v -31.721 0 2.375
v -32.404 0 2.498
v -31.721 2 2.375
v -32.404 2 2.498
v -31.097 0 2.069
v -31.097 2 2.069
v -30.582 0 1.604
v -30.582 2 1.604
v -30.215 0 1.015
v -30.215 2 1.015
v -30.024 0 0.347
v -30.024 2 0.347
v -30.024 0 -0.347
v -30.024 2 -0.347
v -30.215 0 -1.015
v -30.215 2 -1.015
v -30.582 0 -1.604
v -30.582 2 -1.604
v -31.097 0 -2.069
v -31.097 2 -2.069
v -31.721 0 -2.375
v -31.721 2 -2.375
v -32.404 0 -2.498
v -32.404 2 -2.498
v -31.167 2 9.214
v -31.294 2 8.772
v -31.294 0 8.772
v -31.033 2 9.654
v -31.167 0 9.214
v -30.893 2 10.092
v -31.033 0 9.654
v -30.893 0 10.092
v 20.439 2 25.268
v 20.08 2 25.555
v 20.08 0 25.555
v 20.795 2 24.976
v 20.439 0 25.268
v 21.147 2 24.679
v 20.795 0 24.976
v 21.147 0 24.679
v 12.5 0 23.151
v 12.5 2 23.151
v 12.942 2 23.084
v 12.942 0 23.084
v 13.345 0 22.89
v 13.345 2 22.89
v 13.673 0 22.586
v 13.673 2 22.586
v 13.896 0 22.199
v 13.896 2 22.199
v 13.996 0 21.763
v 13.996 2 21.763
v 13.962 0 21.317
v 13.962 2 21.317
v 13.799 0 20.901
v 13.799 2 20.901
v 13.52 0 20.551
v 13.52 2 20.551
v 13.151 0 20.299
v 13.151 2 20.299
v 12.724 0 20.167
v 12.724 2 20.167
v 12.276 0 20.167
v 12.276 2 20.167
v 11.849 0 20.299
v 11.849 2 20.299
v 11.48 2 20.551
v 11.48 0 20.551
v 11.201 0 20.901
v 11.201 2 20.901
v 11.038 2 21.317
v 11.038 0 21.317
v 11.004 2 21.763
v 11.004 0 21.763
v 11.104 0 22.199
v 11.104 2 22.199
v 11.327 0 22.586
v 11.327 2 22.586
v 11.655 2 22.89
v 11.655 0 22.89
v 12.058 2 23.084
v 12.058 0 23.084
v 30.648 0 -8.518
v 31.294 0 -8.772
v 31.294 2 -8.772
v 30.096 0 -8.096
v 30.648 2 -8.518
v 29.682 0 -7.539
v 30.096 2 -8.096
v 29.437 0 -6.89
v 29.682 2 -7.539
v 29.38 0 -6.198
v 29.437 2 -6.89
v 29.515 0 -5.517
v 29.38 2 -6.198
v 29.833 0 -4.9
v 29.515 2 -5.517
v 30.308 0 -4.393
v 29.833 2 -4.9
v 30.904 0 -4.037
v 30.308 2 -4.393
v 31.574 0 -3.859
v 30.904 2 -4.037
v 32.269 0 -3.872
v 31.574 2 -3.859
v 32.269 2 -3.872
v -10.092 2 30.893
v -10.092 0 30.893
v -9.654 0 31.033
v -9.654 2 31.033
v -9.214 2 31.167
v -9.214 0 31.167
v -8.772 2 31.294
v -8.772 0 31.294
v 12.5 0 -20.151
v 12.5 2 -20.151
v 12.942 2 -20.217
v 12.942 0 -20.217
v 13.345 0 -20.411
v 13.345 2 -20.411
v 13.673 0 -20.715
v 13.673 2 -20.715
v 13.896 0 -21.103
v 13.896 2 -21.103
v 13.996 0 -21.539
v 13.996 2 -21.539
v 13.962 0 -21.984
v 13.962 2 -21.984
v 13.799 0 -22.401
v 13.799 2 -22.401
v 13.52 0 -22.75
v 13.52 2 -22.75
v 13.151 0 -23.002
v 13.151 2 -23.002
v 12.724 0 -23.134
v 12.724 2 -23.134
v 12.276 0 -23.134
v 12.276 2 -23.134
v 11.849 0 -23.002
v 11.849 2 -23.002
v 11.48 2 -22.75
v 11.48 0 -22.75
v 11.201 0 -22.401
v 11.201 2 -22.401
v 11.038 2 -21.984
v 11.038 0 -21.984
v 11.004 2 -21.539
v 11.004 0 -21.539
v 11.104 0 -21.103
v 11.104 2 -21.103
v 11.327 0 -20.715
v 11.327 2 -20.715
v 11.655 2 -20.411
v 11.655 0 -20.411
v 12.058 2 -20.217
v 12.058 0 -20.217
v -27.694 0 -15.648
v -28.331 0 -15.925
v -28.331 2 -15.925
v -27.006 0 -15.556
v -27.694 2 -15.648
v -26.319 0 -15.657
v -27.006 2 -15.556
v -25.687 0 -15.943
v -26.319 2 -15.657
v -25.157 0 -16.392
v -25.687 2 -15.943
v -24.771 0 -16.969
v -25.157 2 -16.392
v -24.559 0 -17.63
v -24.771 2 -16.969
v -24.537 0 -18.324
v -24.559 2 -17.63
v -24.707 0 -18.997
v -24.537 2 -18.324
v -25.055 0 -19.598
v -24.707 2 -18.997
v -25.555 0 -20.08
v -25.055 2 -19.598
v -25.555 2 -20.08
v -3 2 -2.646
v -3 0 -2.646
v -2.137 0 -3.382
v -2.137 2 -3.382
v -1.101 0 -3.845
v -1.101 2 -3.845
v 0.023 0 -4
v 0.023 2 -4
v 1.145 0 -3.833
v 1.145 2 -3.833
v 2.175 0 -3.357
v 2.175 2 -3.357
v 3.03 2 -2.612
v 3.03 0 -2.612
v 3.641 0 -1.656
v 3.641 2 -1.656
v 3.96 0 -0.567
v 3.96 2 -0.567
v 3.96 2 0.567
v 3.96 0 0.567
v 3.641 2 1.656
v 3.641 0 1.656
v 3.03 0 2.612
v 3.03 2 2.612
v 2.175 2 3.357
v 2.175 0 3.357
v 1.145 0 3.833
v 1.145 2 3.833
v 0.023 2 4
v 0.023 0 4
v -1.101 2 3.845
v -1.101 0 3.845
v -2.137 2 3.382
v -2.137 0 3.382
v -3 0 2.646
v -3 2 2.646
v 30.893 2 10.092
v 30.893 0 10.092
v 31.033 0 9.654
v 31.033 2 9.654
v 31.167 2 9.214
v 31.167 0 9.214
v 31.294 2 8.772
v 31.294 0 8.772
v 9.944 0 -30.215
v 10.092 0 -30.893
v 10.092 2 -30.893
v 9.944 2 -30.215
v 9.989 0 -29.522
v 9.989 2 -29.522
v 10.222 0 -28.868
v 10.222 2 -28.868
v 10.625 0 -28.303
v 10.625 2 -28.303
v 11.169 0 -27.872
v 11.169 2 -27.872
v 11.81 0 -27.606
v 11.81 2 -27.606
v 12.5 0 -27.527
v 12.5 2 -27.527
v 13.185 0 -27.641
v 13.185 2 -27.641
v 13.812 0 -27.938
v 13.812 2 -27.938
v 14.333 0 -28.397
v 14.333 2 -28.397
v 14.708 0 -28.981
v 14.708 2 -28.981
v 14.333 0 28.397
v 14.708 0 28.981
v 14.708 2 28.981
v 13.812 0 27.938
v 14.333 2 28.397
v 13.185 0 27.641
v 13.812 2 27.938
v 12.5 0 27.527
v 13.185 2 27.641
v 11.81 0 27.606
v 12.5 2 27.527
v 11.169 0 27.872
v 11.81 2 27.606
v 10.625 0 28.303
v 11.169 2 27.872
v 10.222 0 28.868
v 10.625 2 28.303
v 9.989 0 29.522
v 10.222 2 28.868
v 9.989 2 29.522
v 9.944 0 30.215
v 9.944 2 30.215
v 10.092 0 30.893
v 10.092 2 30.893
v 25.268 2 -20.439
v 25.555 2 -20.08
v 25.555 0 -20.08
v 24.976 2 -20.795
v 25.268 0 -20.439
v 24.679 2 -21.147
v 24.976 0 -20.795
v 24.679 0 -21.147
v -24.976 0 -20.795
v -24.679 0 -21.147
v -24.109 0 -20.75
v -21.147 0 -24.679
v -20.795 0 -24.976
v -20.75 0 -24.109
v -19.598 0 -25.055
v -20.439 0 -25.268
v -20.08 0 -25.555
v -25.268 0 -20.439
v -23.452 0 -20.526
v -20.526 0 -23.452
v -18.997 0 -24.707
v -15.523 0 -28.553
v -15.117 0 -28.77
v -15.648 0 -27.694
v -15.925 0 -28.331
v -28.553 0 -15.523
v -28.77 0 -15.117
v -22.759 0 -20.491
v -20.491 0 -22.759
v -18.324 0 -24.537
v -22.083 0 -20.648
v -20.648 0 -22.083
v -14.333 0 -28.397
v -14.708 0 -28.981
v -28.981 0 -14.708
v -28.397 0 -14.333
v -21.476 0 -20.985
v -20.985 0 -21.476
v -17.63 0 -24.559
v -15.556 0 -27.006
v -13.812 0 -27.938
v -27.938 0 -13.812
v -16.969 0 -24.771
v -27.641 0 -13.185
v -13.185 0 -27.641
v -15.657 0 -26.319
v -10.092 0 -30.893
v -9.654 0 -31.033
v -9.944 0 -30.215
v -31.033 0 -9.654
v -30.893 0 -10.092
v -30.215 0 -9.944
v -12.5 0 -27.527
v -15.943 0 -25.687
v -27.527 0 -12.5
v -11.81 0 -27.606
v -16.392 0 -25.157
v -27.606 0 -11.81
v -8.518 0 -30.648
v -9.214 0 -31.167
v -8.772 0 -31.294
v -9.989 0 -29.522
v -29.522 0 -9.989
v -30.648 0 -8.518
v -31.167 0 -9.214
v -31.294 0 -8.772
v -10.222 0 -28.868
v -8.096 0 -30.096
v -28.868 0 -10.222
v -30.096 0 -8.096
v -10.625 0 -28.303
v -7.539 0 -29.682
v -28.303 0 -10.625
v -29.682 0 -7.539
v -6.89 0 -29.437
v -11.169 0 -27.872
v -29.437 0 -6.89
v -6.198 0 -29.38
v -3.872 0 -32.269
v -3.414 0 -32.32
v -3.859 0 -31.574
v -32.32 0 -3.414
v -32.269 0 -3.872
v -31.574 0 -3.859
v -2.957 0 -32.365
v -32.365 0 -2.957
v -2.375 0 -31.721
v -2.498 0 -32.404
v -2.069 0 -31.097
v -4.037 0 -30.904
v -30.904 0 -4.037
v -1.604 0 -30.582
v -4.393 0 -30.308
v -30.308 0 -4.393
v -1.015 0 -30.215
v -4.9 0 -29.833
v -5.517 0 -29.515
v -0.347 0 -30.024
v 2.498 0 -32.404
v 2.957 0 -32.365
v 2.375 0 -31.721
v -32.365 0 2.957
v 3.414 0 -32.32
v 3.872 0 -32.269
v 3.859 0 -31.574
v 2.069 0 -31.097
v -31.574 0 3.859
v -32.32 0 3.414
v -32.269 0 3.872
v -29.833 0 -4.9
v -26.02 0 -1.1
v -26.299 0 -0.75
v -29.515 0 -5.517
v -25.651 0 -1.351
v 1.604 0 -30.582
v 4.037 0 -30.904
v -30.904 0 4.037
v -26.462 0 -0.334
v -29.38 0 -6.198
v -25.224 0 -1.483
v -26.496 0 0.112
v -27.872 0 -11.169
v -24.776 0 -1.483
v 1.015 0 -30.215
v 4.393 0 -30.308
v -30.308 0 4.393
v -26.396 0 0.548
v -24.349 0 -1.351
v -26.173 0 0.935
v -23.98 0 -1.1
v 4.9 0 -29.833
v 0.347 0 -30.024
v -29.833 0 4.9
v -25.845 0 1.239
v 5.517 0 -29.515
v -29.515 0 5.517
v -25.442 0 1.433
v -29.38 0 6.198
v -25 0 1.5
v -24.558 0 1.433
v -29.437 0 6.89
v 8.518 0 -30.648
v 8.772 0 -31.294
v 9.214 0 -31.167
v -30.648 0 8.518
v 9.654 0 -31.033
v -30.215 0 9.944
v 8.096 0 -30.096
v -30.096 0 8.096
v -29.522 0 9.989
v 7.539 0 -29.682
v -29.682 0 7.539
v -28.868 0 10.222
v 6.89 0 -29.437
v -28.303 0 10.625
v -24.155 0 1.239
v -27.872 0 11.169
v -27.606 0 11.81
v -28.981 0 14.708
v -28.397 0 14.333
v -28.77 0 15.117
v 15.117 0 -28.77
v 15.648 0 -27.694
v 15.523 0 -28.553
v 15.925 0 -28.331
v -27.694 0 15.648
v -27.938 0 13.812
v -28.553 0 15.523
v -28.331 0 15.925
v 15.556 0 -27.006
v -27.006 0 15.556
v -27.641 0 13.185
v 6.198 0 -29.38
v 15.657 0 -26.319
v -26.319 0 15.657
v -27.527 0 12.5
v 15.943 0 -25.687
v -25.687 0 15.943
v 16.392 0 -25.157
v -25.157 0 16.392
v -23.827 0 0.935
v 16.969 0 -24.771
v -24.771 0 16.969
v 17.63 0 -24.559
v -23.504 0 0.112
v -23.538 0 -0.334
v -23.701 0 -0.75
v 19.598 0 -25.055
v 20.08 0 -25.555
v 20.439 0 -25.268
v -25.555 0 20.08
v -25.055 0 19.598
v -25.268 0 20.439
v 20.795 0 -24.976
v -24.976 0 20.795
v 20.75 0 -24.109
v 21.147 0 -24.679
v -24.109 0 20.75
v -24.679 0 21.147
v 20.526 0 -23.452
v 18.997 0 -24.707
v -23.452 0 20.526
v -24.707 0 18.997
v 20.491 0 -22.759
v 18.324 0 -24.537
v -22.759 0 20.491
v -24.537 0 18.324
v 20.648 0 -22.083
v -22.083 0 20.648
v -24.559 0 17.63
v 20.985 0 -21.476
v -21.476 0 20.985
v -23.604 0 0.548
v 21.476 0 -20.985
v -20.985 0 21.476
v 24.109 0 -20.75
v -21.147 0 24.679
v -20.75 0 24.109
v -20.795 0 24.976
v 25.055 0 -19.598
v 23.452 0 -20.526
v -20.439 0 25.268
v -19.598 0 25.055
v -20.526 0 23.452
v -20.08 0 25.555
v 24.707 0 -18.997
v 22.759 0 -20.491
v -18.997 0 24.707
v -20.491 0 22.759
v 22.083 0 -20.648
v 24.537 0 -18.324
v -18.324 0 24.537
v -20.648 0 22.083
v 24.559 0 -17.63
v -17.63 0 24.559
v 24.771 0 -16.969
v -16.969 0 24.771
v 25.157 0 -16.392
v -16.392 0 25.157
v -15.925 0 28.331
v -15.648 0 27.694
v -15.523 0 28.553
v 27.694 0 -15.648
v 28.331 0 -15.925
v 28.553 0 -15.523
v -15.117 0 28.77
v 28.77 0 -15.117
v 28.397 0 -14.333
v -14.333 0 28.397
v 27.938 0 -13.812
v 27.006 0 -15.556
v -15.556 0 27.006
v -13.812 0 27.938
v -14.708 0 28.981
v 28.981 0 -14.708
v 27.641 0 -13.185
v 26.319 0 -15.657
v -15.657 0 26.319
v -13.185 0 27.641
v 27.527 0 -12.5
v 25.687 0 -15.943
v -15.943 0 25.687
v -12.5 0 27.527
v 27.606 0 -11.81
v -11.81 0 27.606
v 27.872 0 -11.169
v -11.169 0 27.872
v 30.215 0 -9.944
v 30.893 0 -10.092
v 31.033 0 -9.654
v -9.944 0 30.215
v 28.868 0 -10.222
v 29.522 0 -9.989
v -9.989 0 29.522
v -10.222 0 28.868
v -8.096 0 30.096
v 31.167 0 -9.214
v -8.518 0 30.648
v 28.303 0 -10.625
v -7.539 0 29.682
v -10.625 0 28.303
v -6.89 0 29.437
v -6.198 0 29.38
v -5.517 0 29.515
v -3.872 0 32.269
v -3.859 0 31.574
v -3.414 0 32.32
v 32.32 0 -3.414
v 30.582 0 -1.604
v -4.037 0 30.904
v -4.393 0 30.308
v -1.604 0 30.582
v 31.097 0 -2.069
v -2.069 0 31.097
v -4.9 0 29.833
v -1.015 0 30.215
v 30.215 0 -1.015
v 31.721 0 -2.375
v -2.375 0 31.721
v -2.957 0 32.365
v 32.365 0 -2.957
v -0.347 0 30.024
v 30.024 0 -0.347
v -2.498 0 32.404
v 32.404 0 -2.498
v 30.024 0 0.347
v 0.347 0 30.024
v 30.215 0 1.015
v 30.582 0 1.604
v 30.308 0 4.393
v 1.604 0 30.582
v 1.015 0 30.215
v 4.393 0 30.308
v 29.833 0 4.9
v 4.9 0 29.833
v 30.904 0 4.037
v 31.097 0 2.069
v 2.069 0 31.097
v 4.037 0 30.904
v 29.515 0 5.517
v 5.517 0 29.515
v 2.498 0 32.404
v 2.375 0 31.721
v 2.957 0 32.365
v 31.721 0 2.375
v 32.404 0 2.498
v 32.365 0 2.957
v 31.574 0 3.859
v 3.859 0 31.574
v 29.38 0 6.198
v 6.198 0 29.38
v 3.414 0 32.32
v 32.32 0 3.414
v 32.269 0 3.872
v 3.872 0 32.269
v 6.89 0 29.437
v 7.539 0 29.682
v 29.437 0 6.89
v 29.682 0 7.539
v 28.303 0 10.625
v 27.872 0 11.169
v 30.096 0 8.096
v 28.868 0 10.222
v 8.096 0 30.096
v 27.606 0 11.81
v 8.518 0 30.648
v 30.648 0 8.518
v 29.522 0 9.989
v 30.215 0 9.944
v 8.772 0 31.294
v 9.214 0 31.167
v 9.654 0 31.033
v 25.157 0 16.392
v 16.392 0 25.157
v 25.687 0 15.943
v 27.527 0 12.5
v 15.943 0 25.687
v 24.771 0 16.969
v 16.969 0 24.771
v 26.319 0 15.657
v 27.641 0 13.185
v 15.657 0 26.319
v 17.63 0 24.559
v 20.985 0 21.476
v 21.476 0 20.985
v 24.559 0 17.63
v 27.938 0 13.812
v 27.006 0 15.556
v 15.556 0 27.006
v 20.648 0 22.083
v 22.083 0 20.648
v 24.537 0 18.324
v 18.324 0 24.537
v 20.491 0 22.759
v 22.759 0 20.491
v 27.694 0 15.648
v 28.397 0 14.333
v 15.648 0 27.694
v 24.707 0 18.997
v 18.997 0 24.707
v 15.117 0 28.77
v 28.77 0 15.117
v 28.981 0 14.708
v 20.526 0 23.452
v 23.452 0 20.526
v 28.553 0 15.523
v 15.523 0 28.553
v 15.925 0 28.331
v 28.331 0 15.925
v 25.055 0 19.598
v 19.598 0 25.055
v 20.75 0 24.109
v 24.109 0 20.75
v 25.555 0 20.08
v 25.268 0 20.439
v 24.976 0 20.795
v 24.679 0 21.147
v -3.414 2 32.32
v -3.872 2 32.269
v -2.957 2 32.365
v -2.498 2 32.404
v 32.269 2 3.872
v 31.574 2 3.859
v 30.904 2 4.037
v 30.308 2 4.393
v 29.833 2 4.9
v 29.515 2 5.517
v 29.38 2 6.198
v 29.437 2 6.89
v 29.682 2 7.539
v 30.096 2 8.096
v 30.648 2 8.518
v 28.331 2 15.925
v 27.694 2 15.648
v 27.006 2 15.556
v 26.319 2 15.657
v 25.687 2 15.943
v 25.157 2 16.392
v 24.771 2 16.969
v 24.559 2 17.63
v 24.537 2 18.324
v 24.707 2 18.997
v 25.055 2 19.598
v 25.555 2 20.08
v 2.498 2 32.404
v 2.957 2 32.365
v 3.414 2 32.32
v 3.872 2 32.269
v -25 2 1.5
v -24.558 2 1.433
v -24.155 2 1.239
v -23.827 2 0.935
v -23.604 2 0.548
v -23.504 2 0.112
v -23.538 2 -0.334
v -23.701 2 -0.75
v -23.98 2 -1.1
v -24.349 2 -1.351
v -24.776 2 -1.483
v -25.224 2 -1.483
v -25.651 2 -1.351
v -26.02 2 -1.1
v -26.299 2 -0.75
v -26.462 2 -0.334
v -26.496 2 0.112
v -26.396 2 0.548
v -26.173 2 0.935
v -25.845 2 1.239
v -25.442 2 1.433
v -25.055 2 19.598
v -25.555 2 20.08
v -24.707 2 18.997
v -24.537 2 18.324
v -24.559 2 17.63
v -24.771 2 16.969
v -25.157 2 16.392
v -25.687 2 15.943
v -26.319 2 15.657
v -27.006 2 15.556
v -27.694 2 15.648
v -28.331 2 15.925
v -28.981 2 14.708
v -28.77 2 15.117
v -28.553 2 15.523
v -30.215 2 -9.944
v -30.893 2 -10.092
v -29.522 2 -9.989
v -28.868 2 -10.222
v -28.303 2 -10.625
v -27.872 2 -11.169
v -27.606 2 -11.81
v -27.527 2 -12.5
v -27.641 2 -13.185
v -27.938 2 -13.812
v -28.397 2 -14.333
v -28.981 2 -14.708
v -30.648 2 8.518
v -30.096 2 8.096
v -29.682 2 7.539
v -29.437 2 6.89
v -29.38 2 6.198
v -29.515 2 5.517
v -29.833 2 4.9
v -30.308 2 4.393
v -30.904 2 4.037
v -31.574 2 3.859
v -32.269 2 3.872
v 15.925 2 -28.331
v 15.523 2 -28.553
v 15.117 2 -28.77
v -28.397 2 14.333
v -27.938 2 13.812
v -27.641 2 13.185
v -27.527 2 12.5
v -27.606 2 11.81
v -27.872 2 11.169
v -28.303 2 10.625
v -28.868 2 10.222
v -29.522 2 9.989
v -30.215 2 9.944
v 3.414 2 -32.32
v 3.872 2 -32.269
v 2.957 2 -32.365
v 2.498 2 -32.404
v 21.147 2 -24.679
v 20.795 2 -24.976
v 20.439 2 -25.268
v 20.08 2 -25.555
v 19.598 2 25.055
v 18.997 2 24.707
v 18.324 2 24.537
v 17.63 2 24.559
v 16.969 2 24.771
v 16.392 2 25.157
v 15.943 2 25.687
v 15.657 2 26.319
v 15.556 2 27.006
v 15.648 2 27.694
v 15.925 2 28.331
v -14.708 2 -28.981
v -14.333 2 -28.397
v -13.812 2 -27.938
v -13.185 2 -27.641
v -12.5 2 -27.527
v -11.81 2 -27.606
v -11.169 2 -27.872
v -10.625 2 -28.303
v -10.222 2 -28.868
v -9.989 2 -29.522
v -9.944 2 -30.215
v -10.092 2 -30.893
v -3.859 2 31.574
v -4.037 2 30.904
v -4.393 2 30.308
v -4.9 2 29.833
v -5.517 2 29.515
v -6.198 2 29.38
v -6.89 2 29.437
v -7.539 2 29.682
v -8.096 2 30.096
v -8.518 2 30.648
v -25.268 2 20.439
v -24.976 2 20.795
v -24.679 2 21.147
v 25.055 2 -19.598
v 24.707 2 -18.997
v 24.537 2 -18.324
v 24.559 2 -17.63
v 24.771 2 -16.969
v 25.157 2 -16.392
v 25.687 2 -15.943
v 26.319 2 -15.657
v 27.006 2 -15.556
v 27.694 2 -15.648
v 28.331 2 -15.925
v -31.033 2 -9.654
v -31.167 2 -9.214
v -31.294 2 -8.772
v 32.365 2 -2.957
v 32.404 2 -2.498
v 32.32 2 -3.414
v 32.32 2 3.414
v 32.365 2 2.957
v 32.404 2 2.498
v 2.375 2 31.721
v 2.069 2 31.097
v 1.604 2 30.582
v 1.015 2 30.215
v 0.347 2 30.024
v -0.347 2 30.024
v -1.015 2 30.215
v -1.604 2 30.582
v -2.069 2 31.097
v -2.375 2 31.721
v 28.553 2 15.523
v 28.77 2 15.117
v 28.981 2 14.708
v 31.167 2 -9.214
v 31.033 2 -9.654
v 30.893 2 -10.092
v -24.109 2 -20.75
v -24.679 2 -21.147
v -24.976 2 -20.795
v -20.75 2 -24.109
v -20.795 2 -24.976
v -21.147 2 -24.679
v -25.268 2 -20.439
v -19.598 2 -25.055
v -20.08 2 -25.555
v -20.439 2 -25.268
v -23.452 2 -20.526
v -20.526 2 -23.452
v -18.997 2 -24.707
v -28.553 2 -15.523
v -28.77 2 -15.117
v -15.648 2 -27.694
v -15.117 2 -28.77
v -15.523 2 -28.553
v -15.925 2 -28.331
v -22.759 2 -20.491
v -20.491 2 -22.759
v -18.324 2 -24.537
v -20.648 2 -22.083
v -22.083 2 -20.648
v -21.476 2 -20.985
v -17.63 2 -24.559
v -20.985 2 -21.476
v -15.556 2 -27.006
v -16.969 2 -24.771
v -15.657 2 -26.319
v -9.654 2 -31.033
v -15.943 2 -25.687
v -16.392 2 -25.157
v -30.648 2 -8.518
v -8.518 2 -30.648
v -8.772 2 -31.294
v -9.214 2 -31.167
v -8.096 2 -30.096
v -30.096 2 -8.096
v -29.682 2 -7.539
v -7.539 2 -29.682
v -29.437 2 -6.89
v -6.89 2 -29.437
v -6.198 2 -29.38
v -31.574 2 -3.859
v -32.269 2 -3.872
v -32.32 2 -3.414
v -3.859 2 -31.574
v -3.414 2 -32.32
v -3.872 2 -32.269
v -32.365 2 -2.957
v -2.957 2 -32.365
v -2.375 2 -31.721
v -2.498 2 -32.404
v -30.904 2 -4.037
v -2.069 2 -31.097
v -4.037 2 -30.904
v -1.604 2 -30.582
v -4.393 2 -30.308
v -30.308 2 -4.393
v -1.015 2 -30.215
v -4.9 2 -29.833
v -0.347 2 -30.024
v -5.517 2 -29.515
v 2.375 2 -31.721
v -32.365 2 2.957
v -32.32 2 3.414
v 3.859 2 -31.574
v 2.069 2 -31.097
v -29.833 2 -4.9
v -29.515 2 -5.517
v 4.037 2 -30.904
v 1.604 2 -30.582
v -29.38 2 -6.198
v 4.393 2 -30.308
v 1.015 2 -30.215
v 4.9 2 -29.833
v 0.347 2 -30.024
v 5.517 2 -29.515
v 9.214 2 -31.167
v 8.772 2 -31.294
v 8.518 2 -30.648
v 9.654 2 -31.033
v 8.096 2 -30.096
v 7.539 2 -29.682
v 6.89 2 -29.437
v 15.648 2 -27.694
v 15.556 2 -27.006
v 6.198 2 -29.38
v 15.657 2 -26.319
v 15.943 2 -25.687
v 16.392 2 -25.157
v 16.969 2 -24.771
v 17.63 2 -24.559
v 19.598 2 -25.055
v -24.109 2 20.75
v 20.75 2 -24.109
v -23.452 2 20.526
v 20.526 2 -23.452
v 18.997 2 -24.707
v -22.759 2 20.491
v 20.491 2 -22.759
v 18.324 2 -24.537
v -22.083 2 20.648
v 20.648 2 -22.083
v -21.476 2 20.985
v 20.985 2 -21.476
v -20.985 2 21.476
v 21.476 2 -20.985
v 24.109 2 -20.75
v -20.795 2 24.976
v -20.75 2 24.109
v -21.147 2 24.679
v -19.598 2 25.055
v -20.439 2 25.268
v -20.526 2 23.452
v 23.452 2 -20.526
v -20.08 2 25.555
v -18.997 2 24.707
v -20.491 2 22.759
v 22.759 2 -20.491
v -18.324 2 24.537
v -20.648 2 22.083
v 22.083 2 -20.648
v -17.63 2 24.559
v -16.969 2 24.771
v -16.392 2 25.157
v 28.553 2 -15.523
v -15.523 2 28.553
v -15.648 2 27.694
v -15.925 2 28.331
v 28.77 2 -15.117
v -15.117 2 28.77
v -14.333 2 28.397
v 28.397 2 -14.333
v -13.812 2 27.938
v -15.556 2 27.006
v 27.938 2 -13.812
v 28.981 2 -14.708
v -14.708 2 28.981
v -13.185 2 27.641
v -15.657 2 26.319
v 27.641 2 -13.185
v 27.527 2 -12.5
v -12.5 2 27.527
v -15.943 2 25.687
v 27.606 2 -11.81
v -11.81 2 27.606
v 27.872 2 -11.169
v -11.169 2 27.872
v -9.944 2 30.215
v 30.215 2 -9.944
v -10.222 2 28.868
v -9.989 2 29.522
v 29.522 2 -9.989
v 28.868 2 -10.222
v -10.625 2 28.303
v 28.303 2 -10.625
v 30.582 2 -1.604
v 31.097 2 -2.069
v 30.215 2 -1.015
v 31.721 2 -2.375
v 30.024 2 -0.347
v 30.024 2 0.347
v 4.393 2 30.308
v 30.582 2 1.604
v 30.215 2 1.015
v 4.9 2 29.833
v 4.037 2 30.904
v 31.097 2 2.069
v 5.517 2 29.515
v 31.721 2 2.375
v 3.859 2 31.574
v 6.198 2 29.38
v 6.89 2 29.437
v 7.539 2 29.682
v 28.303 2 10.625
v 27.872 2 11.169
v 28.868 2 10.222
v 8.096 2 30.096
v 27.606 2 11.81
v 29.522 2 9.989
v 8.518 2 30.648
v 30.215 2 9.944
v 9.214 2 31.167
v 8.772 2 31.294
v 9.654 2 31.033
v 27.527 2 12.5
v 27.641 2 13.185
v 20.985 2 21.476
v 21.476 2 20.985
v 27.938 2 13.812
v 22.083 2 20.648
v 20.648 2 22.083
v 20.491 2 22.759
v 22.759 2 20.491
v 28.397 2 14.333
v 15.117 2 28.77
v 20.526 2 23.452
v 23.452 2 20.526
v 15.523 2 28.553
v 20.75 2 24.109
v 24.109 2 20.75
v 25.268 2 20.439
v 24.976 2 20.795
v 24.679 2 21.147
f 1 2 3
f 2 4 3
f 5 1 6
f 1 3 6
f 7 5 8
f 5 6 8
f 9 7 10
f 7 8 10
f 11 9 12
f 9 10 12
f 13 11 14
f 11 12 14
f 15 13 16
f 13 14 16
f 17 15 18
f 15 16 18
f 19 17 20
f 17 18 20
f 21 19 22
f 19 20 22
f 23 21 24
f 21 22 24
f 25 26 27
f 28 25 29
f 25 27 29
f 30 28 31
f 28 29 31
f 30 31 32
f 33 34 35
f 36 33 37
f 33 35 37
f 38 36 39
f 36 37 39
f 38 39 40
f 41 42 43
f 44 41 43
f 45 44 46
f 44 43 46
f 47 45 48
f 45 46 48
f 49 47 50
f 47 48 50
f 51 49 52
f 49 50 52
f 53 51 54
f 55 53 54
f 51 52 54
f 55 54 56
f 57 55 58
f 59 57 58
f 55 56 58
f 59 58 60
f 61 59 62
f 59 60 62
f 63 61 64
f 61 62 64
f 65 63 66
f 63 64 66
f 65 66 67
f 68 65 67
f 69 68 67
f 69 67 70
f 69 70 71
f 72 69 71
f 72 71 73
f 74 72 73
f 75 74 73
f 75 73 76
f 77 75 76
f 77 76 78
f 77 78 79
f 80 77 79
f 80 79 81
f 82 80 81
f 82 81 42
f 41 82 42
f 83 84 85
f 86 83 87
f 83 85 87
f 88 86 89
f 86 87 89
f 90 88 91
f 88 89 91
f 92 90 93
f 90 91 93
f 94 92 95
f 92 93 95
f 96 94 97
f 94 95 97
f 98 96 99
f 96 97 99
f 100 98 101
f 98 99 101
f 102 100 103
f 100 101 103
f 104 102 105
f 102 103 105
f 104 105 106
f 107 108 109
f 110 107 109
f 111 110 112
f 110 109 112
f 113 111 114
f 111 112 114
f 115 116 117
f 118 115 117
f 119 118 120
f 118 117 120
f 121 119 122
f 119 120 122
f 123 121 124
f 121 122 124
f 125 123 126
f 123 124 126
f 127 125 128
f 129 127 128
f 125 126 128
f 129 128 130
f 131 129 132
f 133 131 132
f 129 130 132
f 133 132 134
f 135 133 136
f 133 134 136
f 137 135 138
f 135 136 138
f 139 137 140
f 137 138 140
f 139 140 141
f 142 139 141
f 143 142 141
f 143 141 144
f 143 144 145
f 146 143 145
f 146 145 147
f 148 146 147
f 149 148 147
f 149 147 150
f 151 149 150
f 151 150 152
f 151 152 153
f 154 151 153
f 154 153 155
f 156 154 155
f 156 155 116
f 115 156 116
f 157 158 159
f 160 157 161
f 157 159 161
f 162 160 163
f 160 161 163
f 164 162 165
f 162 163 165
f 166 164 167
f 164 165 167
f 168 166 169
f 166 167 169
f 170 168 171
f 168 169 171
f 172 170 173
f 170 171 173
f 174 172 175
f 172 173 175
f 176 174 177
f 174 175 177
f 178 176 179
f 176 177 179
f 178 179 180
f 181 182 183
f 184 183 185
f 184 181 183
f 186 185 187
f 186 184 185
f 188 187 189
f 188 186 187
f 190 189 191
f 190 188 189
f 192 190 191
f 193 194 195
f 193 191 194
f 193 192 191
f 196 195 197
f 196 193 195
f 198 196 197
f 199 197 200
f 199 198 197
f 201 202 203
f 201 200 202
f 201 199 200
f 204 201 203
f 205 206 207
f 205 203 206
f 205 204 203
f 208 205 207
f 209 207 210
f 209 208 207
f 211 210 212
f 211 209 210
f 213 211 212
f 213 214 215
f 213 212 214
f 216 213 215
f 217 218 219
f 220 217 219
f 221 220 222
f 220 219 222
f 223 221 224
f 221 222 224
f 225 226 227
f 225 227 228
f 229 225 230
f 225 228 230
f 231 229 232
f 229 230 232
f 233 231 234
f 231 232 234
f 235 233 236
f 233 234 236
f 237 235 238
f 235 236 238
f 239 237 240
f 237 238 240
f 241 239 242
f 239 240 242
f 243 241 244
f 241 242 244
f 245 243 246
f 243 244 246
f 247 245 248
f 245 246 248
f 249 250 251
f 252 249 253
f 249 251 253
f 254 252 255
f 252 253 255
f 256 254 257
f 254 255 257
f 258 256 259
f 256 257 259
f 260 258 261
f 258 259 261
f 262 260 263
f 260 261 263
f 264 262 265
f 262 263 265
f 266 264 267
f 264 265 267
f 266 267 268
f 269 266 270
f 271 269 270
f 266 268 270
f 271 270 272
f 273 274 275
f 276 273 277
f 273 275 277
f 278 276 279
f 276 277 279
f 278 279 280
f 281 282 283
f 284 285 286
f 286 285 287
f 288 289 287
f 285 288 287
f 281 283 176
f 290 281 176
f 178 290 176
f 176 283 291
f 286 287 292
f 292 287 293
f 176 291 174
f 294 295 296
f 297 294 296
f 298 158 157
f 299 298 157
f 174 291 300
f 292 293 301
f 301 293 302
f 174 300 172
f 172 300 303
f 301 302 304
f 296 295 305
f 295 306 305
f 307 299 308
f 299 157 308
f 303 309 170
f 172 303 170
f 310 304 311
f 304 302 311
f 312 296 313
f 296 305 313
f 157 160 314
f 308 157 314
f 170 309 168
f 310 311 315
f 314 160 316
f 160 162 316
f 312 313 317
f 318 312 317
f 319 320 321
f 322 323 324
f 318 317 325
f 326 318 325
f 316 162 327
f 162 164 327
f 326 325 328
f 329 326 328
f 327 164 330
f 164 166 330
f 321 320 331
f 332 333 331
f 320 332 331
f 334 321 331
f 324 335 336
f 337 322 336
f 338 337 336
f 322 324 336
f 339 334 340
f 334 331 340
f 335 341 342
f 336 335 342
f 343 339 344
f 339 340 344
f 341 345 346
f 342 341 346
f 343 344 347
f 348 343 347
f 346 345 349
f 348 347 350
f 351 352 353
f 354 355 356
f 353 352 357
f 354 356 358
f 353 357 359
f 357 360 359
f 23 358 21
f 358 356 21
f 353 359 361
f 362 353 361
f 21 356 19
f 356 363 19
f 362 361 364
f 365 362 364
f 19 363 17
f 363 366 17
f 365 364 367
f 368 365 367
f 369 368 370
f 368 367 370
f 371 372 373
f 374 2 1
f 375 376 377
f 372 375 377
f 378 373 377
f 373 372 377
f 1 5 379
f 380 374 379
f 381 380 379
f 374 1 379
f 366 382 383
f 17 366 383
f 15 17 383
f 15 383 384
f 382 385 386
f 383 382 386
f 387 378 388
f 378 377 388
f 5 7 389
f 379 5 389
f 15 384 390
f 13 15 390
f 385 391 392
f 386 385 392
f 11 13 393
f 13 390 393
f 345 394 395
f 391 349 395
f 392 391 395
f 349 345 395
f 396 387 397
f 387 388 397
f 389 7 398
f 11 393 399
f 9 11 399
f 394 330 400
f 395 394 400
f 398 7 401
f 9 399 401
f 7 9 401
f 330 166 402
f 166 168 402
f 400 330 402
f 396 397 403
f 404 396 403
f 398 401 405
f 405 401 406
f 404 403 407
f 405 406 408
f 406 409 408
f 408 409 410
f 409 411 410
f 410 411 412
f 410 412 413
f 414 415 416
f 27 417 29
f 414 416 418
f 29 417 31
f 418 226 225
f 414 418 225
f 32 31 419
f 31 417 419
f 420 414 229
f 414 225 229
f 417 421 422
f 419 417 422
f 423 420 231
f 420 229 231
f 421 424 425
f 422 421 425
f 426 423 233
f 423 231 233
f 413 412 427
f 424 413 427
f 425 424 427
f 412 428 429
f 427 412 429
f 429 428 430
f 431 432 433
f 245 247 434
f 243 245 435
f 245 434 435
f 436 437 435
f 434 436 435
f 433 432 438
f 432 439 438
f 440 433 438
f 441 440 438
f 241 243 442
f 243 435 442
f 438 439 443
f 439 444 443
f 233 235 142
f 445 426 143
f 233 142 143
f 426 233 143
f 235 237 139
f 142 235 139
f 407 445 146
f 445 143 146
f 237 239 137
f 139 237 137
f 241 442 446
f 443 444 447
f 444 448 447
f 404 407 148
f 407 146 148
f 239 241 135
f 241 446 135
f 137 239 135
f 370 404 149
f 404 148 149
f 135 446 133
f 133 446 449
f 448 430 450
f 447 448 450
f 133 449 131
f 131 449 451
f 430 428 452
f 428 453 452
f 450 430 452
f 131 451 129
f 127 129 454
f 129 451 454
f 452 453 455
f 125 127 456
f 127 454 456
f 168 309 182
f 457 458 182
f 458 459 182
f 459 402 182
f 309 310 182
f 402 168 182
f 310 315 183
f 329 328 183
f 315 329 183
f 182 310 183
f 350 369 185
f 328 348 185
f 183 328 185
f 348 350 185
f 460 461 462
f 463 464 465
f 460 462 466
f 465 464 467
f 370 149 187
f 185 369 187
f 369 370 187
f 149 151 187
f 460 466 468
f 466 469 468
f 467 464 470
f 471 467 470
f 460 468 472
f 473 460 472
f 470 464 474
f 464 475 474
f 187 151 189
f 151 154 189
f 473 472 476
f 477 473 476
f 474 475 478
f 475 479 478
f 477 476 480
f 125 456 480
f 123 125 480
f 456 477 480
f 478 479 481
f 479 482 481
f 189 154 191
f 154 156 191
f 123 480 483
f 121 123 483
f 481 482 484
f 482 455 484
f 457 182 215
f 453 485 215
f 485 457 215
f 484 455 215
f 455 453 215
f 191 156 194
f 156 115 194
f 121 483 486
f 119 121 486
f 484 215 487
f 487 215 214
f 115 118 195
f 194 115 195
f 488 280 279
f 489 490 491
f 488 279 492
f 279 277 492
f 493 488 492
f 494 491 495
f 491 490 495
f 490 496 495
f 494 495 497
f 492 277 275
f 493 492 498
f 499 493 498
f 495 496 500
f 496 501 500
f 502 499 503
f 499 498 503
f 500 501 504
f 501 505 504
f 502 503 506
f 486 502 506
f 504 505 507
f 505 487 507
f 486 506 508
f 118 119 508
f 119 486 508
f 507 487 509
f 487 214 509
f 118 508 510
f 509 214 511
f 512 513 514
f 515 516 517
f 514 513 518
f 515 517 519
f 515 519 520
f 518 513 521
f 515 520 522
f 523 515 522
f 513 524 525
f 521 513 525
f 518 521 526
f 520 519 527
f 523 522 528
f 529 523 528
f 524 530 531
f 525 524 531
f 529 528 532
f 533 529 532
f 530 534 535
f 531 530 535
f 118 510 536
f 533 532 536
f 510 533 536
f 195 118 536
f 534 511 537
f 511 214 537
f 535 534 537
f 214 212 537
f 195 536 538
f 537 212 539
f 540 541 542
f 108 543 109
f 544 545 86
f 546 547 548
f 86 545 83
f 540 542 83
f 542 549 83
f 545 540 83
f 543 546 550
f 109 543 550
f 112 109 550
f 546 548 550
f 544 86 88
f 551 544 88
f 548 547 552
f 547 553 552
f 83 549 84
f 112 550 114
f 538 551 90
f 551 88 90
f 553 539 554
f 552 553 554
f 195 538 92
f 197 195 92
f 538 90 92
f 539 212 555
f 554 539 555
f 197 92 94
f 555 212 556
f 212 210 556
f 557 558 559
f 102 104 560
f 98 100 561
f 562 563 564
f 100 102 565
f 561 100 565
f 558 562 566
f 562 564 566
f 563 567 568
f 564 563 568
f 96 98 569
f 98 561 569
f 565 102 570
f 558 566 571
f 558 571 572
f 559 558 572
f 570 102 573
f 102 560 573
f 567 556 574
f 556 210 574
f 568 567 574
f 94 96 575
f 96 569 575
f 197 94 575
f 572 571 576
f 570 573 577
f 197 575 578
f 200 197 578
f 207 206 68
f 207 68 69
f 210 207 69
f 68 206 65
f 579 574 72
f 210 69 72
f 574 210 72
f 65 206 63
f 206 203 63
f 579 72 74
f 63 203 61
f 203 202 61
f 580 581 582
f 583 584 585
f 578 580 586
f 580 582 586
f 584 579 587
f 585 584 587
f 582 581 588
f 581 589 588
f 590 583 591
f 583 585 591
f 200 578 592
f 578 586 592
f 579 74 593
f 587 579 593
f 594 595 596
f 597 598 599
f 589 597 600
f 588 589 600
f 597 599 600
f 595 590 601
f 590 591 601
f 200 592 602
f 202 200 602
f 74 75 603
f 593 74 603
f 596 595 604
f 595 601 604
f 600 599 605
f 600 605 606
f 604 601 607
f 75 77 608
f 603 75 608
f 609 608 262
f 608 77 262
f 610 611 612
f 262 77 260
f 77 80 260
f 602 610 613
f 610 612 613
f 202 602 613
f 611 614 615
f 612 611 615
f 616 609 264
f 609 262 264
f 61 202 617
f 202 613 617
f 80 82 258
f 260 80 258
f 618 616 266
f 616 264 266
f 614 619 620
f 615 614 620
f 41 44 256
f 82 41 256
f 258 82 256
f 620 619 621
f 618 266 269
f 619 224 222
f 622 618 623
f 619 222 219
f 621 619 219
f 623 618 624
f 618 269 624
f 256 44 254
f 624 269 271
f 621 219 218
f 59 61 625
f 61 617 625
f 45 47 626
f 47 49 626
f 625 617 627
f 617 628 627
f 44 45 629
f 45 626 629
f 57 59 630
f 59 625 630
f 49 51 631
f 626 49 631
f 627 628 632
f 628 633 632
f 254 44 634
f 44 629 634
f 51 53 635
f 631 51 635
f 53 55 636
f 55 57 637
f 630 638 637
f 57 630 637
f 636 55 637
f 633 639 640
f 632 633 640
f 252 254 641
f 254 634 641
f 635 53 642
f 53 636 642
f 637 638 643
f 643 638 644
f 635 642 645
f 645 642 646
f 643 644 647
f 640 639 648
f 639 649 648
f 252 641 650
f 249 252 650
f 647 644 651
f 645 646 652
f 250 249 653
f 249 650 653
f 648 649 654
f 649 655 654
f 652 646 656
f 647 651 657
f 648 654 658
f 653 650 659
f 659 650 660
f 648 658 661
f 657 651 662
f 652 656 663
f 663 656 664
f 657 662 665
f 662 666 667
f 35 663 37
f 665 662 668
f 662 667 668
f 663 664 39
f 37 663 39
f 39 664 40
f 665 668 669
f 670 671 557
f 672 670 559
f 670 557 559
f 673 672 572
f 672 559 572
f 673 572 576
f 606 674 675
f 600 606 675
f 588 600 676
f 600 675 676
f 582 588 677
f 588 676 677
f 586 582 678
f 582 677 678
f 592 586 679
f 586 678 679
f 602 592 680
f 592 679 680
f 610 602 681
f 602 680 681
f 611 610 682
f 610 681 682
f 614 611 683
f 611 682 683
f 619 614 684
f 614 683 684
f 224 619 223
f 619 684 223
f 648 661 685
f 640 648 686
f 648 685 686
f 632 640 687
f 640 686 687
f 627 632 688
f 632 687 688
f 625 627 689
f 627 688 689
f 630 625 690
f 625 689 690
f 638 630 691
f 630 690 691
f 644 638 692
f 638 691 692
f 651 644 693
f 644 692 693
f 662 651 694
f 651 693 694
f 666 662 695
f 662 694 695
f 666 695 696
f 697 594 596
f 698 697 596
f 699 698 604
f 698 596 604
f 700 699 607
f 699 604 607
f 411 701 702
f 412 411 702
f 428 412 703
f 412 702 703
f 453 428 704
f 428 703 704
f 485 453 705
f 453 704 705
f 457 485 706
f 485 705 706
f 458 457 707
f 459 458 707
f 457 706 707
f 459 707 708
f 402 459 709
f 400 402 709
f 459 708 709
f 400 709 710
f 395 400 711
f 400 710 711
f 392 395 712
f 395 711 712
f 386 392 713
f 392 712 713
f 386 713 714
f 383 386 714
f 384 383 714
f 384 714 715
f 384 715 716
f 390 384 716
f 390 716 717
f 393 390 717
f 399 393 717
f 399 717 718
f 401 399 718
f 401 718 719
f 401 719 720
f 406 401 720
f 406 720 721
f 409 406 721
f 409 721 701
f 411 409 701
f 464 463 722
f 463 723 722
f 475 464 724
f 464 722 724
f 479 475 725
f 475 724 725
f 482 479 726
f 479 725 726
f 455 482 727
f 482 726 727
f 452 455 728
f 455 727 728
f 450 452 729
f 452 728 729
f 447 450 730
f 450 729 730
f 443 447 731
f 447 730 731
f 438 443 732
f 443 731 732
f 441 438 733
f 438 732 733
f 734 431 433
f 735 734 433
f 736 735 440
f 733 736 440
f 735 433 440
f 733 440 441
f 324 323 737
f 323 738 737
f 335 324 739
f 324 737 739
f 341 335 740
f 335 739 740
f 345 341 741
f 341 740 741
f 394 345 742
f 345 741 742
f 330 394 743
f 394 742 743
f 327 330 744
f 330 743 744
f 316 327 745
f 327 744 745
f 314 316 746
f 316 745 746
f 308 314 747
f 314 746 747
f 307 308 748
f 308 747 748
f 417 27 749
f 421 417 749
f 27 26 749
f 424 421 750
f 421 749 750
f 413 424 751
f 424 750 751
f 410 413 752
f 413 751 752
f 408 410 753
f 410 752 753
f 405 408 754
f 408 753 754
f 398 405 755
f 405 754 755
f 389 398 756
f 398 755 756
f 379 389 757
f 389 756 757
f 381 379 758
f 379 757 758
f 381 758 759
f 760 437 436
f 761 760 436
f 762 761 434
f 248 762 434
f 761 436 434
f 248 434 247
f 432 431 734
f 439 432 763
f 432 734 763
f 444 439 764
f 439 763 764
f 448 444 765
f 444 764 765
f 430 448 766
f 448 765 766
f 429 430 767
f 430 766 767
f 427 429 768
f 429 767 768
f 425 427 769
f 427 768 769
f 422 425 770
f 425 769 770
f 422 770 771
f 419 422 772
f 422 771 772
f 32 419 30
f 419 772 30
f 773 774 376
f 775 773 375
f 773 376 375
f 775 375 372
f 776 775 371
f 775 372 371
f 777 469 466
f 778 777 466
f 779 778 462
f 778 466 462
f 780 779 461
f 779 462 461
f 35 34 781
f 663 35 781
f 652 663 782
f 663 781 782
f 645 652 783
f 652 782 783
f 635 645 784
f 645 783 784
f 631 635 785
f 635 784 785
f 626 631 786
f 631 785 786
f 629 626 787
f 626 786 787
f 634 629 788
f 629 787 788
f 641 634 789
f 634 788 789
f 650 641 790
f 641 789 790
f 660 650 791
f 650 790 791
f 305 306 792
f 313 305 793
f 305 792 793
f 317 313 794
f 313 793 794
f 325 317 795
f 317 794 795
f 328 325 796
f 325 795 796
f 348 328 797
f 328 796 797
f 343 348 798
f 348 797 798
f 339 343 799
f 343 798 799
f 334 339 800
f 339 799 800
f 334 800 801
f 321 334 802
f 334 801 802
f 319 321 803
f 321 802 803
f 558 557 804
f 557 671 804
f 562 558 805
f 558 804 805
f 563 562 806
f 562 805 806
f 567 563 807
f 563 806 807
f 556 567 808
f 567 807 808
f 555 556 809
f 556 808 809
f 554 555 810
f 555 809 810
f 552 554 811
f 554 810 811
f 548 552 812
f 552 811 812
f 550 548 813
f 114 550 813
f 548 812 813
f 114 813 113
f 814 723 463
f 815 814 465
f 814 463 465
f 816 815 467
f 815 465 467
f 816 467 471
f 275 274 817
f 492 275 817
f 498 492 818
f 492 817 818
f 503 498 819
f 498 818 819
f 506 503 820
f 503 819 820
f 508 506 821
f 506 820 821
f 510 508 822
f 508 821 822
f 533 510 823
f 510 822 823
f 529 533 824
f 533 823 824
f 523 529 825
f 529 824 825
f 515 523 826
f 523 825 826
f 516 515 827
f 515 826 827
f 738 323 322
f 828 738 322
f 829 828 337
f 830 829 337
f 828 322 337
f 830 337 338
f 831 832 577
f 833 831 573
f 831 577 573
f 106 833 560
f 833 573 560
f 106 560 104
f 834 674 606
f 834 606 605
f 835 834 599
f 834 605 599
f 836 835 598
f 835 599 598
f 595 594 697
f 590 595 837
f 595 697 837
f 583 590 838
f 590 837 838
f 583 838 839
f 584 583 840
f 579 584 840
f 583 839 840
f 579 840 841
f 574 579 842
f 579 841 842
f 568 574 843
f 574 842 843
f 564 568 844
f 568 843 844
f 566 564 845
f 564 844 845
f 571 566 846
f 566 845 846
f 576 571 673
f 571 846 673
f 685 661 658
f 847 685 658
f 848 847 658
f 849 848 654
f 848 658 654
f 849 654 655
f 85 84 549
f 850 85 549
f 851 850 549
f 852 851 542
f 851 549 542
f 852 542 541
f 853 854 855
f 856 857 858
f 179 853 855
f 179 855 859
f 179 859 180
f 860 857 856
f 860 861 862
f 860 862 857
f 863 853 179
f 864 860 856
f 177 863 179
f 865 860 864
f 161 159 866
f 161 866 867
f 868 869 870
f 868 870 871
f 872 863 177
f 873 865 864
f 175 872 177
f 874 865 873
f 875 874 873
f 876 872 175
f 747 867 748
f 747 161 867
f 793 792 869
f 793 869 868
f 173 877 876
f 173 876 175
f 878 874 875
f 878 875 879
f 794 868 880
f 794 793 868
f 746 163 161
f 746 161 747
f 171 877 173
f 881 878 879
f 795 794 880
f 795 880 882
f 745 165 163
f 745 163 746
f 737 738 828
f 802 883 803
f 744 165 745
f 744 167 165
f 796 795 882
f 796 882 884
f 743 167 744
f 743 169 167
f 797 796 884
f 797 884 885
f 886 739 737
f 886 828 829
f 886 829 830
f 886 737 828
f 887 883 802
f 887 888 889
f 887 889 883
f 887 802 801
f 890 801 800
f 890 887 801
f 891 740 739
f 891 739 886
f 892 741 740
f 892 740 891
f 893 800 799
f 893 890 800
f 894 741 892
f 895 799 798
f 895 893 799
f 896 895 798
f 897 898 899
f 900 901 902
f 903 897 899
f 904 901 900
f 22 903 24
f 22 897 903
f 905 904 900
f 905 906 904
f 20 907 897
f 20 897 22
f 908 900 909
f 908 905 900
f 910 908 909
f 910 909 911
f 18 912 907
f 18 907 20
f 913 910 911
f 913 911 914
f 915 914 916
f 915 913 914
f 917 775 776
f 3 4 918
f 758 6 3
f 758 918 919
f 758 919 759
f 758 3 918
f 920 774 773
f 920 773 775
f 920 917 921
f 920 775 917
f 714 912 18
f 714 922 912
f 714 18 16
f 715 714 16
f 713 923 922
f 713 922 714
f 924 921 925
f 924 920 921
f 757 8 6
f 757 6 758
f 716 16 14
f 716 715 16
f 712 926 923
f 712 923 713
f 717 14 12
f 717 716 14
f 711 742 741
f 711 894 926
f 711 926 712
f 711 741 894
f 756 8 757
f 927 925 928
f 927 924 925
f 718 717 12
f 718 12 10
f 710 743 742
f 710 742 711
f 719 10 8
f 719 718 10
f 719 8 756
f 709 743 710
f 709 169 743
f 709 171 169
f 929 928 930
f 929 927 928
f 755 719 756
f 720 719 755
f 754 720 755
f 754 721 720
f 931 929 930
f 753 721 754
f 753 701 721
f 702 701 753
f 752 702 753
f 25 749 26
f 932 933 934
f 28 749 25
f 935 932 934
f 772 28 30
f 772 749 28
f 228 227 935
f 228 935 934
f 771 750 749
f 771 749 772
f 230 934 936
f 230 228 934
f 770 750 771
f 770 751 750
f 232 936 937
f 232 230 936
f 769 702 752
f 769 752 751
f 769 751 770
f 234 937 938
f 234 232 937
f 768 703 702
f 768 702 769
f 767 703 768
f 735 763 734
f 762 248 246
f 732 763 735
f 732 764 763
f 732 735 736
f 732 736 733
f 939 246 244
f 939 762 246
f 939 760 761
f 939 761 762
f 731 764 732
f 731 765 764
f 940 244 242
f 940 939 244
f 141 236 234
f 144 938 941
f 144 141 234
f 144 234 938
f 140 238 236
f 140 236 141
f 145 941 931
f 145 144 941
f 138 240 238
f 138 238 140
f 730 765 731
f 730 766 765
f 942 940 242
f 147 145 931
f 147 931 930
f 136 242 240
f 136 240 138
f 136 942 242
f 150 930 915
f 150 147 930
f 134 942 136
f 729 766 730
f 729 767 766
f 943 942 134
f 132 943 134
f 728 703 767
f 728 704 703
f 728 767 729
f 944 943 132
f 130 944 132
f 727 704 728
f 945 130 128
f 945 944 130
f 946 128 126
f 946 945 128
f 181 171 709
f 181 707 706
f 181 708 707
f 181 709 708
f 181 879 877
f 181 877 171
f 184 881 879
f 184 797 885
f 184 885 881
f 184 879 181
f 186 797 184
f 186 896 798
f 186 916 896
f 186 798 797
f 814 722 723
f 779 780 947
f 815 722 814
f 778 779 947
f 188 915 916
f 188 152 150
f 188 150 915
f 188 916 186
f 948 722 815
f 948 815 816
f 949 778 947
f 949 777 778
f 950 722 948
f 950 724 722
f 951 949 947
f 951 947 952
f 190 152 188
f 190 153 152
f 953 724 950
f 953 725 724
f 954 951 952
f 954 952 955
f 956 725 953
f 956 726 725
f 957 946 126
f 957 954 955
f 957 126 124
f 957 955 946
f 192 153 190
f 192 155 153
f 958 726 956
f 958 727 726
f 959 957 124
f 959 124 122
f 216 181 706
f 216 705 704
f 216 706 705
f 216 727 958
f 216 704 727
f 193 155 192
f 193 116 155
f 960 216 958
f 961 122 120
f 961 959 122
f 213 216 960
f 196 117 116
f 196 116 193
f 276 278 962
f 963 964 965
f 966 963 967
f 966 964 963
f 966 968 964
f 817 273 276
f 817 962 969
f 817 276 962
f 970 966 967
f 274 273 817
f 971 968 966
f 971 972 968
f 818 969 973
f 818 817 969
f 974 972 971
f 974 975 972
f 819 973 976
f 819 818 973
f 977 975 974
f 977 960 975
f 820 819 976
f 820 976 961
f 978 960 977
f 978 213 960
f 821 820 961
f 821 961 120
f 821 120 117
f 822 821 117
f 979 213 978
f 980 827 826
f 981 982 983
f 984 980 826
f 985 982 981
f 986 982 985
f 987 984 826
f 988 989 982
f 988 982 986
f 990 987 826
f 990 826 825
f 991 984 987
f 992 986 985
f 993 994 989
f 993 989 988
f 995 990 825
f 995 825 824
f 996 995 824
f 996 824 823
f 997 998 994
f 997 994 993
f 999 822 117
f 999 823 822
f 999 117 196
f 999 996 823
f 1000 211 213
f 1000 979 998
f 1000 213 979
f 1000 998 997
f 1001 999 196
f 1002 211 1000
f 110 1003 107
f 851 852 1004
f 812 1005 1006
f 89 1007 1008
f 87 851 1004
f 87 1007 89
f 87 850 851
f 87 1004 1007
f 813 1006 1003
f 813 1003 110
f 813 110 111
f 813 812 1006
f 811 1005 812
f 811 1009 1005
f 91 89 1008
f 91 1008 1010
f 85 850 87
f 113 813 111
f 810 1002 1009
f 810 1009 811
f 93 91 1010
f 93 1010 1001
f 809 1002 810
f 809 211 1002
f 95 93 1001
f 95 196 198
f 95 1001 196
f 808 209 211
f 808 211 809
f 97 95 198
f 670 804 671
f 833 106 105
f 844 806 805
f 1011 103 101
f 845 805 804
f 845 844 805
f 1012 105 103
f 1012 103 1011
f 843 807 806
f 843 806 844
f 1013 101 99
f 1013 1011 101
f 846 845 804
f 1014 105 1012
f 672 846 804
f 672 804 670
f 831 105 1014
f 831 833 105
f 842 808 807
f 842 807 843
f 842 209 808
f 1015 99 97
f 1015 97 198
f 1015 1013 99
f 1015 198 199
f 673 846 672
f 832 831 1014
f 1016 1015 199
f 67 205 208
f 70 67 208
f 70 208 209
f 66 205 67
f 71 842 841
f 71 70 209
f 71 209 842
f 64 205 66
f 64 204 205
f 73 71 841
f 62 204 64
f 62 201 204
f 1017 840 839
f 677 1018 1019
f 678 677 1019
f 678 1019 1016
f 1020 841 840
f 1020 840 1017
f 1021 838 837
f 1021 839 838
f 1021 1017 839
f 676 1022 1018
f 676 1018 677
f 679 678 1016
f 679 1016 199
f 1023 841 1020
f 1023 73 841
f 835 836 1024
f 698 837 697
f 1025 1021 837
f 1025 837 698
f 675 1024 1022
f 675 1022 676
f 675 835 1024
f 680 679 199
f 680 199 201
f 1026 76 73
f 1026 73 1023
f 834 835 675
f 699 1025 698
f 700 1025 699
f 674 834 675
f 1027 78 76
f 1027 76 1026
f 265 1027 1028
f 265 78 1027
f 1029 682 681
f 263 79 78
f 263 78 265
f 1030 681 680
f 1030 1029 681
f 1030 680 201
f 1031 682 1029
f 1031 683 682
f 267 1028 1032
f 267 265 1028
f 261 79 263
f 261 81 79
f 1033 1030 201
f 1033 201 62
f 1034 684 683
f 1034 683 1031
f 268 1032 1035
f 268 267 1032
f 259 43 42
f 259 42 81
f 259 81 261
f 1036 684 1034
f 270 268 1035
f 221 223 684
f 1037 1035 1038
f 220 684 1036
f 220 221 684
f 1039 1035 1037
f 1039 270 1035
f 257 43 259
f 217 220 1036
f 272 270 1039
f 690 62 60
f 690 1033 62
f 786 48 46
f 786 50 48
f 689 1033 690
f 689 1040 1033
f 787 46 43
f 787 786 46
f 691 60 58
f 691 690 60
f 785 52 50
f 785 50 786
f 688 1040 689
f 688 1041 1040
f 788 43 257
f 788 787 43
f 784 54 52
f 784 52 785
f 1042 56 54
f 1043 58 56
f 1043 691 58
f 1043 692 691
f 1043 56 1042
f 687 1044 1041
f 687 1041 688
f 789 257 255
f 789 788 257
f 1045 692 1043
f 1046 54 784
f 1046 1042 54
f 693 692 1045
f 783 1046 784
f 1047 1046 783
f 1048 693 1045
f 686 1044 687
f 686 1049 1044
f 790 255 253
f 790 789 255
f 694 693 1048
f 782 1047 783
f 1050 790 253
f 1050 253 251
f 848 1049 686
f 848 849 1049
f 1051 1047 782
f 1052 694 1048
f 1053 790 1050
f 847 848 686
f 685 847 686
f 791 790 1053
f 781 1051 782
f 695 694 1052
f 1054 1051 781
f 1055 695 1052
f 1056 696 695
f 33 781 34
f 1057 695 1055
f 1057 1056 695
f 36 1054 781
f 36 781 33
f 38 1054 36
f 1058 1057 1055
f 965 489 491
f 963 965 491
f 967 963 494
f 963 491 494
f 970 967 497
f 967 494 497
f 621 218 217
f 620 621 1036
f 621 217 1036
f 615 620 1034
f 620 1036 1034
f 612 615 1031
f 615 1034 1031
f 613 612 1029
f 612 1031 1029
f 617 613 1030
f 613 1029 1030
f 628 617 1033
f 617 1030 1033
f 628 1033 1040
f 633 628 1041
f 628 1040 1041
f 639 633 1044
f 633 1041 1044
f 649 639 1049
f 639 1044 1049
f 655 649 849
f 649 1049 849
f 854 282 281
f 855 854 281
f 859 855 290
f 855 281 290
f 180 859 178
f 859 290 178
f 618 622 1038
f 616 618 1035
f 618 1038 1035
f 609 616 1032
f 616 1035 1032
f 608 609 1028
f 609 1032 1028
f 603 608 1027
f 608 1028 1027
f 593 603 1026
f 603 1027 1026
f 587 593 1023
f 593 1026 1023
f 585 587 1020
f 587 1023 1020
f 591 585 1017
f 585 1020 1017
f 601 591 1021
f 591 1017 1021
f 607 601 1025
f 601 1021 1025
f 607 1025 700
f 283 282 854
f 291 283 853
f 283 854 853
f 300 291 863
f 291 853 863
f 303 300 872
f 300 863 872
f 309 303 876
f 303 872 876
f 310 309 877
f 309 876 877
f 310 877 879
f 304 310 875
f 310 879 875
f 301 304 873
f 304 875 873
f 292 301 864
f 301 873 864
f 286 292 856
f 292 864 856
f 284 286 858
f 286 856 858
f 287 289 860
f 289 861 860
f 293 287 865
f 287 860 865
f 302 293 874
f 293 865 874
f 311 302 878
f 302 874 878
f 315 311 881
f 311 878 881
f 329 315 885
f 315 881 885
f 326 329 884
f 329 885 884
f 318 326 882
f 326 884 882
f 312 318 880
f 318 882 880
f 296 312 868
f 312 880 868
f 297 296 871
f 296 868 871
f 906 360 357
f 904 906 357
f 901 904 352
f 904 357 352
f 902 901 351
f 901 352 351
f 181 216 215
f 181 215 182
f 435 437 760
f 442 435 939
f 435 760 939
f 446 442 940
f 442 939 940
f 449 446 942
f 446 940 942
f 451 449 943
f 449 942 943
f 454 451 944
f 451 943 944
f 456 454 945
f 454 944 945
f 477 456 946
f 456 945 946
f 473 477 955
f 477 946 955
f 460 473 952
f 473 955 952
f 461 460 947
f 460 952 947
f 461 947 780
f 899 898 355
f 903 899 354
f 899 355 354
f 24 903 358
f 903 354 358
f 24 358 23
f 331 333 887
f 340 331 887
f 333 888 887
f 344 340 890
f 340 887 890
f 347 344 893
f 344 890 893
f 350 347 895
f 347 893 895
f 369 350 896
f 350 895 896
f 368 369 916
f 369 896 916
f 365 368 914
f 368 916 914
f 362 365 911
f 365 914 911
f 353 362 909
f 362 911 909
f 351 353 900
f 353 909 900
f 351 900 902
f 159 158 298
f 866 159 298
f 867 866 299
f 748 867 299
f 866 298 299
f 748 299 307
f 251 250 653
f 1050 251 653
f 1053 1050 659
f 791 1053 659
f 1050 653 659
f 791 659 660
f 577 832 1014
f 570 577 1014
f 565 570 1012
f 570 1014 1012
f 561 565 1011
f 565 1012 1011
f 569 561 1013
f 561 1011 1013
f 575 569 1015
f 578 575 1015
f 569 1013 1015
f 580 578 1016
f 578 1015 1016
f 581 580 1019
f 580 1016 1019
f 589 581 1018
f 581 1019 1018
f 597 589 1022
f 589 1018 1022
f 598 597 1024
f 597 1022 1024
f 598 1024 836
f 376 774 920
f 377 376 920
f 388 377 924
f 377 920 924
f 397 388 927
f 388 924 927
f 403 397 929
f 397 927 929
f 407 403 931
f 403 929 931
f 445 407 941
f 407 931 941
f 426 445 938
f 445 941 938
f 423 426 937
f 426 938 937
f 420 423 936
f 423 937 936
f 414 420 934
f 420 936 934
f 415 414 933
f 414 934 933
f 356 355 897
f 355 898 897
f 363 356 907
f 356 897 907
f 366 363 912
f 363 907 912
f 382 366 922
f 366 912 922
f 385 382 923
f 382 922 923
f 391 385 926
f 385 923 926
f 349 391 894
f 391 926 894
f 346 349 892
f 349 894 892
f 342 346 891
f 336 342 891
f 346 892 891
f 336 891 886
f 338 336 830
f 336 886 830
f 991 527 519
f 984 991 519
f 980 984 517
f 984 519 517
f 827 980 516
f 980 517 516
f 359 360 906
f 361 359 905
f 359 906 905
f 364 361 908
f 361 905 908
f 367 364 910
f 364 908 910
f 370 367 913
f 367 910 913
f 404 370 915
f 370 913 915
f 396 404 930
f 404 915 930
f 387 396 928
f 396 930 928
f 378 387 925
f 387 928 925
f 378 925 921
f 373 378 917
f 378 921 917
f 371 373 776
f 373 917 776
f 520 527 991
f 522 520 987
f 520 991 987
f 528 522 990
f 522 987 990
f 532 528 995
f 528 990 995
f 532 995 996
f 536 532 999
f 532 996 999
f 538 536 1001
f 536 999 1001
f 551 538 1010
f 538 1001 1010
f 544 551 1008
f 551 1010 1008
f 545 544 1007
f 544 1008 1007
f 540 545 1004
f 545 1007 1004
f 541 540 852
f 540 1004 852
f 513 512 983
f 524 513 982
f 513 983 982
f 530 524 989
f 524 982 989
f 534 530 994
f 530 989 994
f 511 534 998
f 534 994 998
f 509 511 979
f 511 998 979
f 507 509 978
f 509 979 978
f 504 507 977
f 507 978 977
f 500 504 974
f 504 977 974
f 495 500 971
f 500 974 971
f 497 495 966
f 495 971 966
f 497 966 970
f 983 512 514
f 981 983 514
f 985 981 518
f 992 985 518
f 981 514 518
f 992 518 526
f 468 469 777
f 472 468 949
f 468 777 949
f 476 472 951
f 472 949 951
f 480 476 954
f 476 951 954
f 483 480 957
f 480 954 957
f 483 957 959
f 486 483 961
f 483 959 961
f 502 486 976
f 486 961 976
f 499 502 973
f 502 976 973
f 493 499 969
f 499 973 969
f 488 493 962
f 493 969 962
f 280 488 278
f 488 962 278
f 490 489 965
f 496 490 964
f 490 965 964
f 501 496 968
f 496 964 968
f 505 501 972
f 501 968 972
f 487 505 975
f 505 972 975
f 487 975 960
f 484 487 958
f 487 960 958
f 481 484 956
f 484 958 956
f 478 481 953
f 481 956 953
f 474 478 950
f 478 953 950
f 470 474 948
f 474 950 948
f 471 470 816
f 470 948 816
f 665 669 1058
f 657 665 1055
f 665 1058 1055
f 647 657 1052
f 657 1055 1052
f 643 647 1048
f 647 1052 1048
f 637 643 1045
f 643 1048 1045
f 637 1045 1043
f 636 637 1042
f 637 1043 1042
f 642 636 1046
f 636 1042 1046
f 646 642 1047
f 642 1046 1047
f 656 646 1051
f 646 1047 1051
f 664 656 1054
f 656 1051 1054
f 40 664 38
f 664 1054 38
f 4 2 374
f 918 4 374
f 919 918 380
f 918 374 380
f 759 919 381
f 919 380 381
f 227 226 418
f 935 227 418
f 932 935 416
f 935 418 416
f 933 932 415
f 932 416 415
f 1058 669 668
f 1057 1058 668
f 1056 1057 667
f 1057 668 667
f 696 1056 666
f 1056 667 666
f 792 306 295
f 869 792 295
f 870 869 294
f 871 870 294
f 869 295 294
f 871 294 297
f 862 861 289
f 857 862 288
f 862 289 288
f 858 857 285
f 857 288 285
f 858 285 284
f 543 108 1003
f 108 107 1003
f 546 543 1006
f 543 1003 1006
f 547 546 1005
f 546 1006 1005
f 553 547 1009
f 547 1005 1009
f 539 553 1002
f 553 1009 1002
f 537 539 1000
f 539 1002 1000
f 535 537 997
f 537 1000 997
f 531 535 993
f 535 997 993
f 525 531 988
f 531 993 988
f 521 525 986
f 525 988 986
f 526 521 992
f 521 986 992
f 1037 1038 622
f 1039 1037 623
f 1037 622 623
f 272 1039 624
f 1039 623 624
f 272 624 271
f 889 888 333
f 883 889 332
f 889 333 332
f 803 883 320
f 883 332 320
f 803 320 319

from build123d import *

# Parameters (mm, degrees)
SKETCH1_R           = 32.5
BOSS_EXTRUDE1_DEPTH = 2
CUT_EXTRUDE2_DEPTH  = 47.005434462
SKETCH2_R           = 2.5
CUT_EXTRUDE1_DEPTH  = 47.005434462
SKETCH5_R           = 1.5
CUT_EXTRUDE3_DEPTH  = 10


with BuildPart() as part:
    # Sketch1 → Boss-Extrude1 (new body)
    with BuildSketch(Plane(origin=(0, 0, 0), x_dir=(1, 0, 0), z_dir=(0, 1, 0))):
        with Locations(Location((0, 0, 0), (0, 0, 270))):
            Circle(SKETCH1_R)
    extrude(amount=BOSS_EXTRUDE1_DEPTH)

    # Sketch4 → Cut-Extrude2 (cut, through all)
    with BuildSketch(Plane(origin=(0, 2, 0), x_dir=(1, 0, 0), z_dir=(0, 1, 0))):
        with BuildLine():
            Line((-3, -2.645751311), (-3, 2.645751311))
            ThreePointArc((-3, 2.645751311), (4, 0), (-3, -2.645751311))
        make_face()
    extrude(amount=-CUT_EXTRUDE2_DEPTH, mode=Mode.SUBTRACT)

    # Sketch2 → Cut-Extrude1 (cut, through all)
    with BuildSketch(Plane(origin=(0, 2, 0), x_dir=(1, 0, 0), z_dir=(0, 1, 0))):
        with Locations((-30.026084807, -12.437211552)):
            Circle(SKETCH2_R)
        with Locations((-32.5, 0)):
            Circle(SKETCH2_R)
        with Locations((-31.875521613, 6.340435466)):
            Circle(SKETCH2_R)
        with Locations((-30.026084807, 12.437211552)):
            Circle(SKETCH2_R)
        with Locations((-27.0227624, 18.056032573)):
            Circle(SKETCH2_R)
        with Locations((-22.980970389, 22.980970389)):
            Circle(SKETCH2_R)
        with Locations((-18.056032573, 27.0227624)):
            Circle(SKETCH2_R)
        with Locations((-12.437211552, 30.026084807)):
            Circle(SKETCH2_R)
        with Locations((-6.340435466, 31.875521613)):
            Circle(SKETCH2_R)
        with Locations((0, 32.5)):
            Circle(SKETCH2_R)
        with Locations((6.340435466, 31.875521613)):
            Circle(SKETCH2_R)
        with Locations((12.437211552, 30.026084807)):
            Circle(SKETCH2_R)
        with Locations((18.056032573, 27.0227624)):
            Circle(SKETCH2_R)
        with Locations((22.980970389, 22.980970389)):
            Circle(SKETCH2_R)
        with Locations((27.0227624, 18.056032573)):
            Circle(SKETCH2_R)
        with Locations((30.026084807, 12.437211552)):
            Circle(SKETCH2_R)
        with Locations((31.875521613, 6.340435466)):
            Circle(SKETCH2_R)
        with Locations((32.5, 0)):
            Circle(SKETCH2_R)
        with Locations((31.875521613, -6.340435466)):
            Circle(SKETCH2_R)
        with Locations((30.026084807, -12.437211552)):
            Circle(SKETCH2_R)
        with Locations((27.0227624, -18.056032573)):
            Circle(SKETCH2_R)
        with Locations((22.980970389, -22.980970389)):
            Circle(SKETCH2_R)
        with Locations((18.056032573, -27.0227624)):
            Circle(SKETCH2_R)
        with Locations((12.437211552, -30.026084807)):
            Circle(SKETCH2_R)
        with Locations((6.340435466, -31.875521613)):
            Circle(SKETCH2_R)
        with Locations((0, -32.5)):
            Circle(SKETCH2_R)
        with Locations((-6.340435466, -31.875521613)):
            Circle(SKETCH2_R)
        with Locations((-12.437211552, -30.026084807)):
            Circle(SKETCH2_R)
        with Locations((-18.056032573, -27.0227624)):
            Circle(SKETCH2_R)
        with Locations((-22.980970389, -22.980970389)):
            Circle(SKETCH2_R)
        with Locations((-27.0227624, -18.056032573)):
            Circle(SKETCH2_R)
        with Locations((-31.875521613, -6.340435466)):
            Circle(SKETCH2_R)
    extrude(amount=-CUT_EXTRUDE1_DEPTH, mode=Mode.SUBTRACT)

    # Sketch5 → Cut-Extrude3 (cut)
    with BuildSketch(Plane(origin=(0, 2, 0), x_dir=(1, 0, 0), z_dir=(0, 1, 0))):
        with Locations(Location((-25, 0, 0), (0, 0, 270))):
            Circle(SKETCH5_R)
        with Locations(Location((12.5, 21.650635095, 0), (0, 0, 270))):
            Circle(SKETCH5_R)
        with Locations(Location((12.5, -21.650635095, 0), (0, 0, 270))):
            Circle(SKETCH5_R)
    extrude(amount=-CUT_EXTRUDE3_DEPTH, mode=Mode.SUBTRACT)


solid = part.part
